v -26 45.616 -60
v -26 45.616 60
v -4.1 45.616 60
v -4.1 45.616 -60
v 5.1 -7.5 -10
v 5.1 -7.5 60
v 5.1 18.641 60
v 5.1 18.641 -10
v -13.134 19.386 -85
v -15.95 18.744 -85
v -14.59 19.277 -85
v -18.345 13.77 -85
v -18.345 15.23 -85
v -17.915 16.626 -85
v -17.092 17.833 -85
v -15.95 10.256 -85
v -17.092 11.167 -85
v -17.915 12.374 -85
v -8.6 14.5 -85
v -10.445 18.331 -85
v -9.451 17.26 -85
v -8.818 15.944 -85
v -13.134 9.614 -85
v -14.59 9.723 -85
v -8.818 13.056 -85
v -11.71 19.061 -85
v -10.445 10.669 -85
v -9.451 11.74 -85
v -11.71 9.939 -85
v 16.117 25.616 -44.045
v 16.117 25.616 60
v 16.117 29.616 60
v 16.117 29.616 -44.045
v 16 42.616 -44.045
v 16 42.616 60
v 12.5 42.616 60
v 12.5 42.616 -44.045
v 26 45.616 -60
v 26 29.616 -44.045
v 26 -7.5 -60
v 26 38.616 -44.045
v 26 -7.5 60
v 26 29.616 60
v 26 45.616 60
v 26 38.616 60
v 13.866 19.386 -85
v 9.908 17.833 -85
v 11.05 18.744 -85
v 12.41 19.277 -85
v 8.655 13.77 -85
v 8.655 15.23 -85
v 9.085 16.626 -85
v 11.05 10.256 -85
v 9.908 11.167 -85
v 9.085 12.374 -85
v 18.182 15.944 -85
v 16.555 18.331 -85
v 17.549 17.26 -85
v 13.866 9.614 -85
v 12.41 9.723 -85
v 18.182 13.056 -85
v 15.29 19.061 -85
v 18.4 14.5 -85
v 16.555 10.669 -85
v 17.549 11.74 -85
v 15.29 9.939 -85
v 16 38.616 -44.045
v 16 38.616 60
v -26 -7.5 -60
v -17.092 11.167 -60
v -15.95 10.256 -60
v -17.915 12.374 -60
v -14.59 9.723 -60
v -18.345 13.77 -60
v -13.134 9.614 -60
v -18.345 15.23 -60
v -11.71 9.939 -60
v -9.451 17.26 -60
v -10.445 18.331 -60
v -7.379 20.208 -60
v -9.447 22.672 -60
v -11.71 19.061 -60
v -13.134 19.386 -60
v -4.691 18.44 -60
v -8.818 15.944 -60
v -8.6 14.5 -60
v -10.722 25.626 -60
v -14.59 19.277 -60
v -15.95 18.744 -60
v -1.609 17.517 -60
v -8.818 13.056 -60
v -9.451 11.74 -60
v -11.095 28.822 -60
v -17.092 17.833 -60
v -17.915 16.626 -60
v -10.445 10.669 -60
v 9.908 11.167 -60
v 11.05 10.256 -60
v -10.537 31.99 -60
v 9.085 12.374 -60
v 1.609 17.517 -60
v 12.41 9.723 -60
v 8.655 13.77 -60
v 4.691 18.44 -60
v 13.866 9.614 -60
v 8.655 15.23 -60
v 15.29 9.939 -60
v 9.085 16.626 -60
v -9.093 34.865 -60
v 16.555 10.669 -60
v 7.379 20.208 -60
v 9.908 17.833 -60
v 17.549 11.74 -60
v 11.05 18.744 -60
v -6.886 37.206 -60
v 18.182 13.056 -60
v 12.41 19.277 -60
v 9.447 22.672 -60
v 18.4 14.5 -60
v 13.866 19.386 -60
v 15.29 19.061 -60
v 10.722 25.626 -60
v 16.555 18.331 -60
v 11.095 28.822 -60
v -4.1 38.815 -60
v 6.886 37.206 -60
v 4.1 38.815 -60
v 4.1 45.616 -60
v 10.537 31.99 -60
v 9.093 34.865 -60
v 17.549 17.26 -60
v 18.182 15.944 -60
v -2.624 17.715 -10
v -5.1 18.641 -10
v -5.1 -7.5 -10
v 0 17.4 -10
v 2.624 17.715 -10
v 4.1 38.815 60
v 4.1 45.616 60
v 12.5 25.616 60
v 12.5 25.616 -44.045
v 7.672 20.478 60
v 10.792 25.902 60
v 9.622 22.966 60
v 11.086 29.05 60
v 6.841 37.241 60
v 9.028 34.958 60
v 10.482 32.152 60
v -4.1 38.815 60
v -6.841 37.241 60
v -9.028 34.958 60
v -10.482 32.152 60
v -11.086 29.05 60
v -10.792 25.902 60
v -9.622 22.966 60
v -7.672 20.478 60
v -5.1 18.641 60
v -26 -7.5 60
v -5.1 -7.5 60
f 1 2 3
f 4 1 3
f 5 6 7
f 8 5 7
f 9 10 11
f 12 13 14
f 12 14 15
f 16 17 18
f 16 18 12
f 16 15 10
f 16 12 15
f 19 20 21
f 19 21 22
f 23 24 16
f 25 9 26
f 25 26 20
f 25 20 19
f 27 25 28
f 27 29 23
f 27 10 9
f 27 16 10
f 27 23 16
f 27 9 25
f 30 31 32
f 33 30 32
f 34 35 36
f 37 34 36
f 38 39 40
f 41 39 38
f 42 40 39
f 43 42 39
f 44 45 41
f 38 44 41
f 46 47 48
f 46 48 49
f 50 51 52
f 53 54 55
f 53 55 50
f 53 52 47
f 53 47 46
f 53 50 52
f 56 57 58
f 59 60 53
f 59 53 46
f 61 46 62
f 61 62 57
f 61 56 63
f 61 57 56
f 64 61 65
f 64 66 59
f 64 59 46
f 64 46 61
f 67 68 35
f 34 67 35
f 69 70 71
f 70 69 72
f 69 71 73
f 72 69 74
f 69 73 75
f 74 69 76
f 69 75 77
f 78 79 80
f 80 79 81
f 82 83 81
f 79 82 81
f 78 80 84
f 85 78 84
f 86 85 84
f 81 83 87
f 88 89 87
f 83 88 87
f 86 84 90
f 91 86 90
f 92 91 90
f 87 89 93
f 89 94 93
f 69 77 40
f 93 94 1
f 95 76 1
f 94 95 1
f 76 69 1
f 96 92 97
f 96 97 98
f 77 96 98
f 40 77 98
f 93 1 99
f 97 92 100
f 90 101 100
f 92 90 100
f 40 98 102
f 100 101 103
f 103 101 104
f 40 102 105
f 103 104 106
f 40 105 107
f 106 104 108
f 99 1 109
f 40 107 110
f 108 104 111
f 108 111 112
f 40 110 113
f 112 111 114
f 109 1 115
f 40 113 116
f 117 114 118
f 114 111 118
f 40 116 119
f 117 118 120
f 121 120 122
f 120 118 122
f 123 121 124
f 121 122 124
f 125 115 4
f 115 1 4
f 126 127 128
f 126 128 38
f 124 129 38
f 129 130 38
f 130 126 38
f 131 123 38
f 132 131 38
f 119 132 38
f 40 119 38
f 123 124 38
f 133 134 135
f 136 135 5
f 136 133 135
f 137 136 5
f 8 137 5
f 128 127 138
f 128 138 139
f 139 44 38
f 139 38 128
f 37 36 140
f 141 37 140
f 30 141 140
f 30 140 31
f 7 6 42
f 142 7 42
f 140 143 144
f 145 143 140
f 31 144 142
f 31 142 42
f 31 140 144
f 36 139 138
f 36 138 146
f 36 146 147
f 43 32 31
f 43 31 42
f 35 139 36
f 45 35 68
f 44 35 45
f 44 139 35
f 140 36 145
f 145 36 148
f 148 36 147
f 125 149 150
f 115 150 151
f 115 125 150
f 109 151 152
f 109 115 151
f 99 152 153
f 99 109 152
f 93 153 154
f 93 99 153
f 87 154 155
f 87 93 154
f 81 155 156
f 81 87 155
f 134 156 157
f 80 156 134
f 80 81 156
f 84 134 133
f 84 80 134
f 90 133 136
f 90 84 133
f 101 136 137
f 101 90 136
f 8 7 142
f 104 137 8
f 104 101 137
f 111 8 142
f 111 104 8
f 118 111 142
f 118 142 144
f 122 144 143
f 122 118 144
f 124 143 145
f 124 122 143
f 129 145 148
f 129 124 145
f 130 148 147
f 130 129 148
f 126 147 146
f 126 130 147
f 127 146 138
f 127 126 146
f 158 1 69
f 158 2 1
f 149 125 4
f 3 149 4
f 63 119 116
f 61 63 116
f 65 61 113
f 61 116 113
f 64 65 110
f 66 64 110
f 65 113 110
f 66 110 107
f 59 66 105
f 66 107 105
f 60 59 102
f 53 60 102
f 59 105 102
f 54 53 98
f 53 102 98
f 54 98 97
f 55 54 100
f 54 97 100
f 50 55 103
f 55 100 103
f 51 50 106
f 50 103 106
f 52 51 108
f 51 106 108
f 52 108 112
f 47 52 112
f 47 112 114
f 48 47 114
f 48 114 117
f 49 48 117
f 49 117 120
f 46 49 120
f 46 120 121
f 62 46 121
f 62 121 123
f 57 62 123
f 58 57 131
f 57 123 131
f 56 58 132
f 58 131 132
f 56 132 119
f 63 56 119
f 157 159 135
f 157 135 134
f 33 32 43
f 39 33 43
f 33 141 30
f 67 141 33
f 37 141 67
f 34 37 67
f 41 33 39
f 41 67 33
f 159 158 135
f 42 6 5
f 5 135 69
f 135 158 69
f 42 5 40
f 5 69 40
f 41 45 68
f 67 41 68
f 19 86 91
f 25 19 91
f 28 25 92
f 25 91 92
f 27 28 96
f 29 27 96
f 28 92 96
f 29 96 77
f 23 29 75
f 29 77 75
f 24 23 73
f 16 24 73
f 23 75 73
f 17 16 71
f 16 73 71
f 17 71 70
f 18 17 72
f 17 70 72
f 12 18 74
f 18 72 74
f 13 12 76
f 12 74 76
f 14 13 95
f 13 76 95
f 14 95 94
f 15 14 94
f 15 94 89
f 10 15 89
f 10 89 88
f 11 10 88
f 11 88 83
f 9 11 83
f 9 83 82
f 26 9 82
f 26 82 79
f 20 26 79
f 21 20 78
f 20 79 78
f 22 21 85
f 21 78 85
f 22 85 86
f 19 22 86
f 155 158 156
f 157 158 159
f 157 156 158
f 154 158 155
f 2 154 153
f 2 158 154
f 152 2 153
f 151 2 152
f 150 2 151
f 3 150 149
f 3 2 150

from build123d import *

# Parameters (mm, degrees)
SKETCH_2_W               = 52
SKETCH_2_H               = 120
EXTRUDE_1_DEPTH          = 7.5
SKETCH_3_R               = 11.1
EXTRUDE_2_DEPTH          = 60
CUT_EXTRUDE_1_DEPTH      = 81.007562143
CUT_EXTRUDE_1_DEPTH_BACK = 81.007562143
SKETCH_4_W               = 8.2
SKETCH_4_H               = 8.069924866
SKETCH_5_W               = 10.2
SKETCH_5_H               = 26.140993965
CUT_EXTRUDE_2_DEPTH      = 70
SKETCH_6_R               = 4.9
EXTRUDE_3_DEPTH          = 25
EXTRUDE_4_DEPTH          = 120
CUT_EXTRUDE_3_DEPTH      = 104.044523


with BuildPart() as part:
    # 스케치2 → 보스-돌출1 (new, symmetric)
    with BuildSketch(Plane(origin=(0, 0, 0), x_dir=(1, 0, 0), z_dir=(0, 1, 0))):
        Rectangle(SKETCH_2_W, SKETCH_2_H)
    extrude(amount=EXTRUDE_1_DEPTH, both=True)

    # 스케치3 → 보스-돌출2 (add, symmetric)
    with BuildSketch(Plane.XY):
        with BuildLine():
            Line((-26, 32.5), (-26, 7.5))
            Line((-26, 7.5), (26, 7.5))
            Line((26, 7.5), (26, 32.5))
            Line((26, 32.5), (9.6493822, 43.219015699))
            ThreePointArc((9.6493822, 43.219015699), (0, 46.1), (-9.6493822, 43.219015699))
            Line((-9.6493822, 43.219015699), (-26, 32.5))
        make_face()
        with Locations((0, 28.5)):
            Circle(SKETCH_3_R, mode=Mode.SUBTRACT)
    extrude(amount=EXTRUDE_2_DEPTH, both=True)

    # 스케치4 → 컷-돌출1 (cut, two sides: drawn at the far end of the back side and taken through both)
    with BuildSketch(Plane.XY.offset(-CUT_EXTRUDE_1_DEPTH_BACK)):
        with Locations((0, 42.85)):
            Rectangle(SKETCH_4_W, SKETCH_4_H)
    extrude(amount=CUT_EXTRUDE_1_DEPTH + CUT_EXTRUDE_1_DEPTH_BACK, mode=Mode.SUBTRACT)

    # 스케치5 → 컷-돌출2 (cut)
    with BuildSketch(Plane.XY.offset(60)):
        with Locations((0, 5.570496982)):
            Rectangle(SKETCH_5_W, SKETCH_5_H)
    extrude(amount=-CUT_EXTRUDE_2_DEPTH, mode=Mode.SUBTRACT)

    # 스케치6 → 보스-돌출3 (add)
    with BuildSketch(Plane(origin=(0, 0, -60), x_dir=(-1, 0, 0), z_dir=(0, 0, -1))):
        with Locations(Location((13.5, 14.5, 0), (0, 0, 180))):
            Circle(SKETCH_6_R)
        with Locations(Location((-13.5, 14.5, 0), (0, 0, 180))):
            Circle(SKETCH_6_R)
    extrude(amount=EXTRUDE_3_DEPTH)

    # 스케치9 → 보스-돌출4 (add)
    with BuildSketch(Plane.XY.offset(60)):
        Polygon((4.1, 45.615782191), (6.978359415, 44.657428628), (26, 32.5), (26, 45.615782191), align=None)
        Polygon((-26, 45.615782191), (-4.1, 45.615782191), (-6.978359415, 44.657428628), (-26, 32.5), align=None)
    extrude(amount=-EXTRUDE_4_DEPTH)

    # 스케치13 → 컷-돌출3 (cut)
    with BuildSketch(Plane.XY.offset(60)):
        Polygon((26, 38.615782191), (16, 38.615782191), (16, 42.615782191), (12.5, 42.615782191), (12.5, 25.615782191), (16.116710555, 25.615782191), (16.116710555, 29.615782191), (26, 29.615782191), align=None)
    extrude(amount=-CUT_EXTRUDE_3_DEPTH, mode=Mode.SUBTRACT)


solid = part.part
